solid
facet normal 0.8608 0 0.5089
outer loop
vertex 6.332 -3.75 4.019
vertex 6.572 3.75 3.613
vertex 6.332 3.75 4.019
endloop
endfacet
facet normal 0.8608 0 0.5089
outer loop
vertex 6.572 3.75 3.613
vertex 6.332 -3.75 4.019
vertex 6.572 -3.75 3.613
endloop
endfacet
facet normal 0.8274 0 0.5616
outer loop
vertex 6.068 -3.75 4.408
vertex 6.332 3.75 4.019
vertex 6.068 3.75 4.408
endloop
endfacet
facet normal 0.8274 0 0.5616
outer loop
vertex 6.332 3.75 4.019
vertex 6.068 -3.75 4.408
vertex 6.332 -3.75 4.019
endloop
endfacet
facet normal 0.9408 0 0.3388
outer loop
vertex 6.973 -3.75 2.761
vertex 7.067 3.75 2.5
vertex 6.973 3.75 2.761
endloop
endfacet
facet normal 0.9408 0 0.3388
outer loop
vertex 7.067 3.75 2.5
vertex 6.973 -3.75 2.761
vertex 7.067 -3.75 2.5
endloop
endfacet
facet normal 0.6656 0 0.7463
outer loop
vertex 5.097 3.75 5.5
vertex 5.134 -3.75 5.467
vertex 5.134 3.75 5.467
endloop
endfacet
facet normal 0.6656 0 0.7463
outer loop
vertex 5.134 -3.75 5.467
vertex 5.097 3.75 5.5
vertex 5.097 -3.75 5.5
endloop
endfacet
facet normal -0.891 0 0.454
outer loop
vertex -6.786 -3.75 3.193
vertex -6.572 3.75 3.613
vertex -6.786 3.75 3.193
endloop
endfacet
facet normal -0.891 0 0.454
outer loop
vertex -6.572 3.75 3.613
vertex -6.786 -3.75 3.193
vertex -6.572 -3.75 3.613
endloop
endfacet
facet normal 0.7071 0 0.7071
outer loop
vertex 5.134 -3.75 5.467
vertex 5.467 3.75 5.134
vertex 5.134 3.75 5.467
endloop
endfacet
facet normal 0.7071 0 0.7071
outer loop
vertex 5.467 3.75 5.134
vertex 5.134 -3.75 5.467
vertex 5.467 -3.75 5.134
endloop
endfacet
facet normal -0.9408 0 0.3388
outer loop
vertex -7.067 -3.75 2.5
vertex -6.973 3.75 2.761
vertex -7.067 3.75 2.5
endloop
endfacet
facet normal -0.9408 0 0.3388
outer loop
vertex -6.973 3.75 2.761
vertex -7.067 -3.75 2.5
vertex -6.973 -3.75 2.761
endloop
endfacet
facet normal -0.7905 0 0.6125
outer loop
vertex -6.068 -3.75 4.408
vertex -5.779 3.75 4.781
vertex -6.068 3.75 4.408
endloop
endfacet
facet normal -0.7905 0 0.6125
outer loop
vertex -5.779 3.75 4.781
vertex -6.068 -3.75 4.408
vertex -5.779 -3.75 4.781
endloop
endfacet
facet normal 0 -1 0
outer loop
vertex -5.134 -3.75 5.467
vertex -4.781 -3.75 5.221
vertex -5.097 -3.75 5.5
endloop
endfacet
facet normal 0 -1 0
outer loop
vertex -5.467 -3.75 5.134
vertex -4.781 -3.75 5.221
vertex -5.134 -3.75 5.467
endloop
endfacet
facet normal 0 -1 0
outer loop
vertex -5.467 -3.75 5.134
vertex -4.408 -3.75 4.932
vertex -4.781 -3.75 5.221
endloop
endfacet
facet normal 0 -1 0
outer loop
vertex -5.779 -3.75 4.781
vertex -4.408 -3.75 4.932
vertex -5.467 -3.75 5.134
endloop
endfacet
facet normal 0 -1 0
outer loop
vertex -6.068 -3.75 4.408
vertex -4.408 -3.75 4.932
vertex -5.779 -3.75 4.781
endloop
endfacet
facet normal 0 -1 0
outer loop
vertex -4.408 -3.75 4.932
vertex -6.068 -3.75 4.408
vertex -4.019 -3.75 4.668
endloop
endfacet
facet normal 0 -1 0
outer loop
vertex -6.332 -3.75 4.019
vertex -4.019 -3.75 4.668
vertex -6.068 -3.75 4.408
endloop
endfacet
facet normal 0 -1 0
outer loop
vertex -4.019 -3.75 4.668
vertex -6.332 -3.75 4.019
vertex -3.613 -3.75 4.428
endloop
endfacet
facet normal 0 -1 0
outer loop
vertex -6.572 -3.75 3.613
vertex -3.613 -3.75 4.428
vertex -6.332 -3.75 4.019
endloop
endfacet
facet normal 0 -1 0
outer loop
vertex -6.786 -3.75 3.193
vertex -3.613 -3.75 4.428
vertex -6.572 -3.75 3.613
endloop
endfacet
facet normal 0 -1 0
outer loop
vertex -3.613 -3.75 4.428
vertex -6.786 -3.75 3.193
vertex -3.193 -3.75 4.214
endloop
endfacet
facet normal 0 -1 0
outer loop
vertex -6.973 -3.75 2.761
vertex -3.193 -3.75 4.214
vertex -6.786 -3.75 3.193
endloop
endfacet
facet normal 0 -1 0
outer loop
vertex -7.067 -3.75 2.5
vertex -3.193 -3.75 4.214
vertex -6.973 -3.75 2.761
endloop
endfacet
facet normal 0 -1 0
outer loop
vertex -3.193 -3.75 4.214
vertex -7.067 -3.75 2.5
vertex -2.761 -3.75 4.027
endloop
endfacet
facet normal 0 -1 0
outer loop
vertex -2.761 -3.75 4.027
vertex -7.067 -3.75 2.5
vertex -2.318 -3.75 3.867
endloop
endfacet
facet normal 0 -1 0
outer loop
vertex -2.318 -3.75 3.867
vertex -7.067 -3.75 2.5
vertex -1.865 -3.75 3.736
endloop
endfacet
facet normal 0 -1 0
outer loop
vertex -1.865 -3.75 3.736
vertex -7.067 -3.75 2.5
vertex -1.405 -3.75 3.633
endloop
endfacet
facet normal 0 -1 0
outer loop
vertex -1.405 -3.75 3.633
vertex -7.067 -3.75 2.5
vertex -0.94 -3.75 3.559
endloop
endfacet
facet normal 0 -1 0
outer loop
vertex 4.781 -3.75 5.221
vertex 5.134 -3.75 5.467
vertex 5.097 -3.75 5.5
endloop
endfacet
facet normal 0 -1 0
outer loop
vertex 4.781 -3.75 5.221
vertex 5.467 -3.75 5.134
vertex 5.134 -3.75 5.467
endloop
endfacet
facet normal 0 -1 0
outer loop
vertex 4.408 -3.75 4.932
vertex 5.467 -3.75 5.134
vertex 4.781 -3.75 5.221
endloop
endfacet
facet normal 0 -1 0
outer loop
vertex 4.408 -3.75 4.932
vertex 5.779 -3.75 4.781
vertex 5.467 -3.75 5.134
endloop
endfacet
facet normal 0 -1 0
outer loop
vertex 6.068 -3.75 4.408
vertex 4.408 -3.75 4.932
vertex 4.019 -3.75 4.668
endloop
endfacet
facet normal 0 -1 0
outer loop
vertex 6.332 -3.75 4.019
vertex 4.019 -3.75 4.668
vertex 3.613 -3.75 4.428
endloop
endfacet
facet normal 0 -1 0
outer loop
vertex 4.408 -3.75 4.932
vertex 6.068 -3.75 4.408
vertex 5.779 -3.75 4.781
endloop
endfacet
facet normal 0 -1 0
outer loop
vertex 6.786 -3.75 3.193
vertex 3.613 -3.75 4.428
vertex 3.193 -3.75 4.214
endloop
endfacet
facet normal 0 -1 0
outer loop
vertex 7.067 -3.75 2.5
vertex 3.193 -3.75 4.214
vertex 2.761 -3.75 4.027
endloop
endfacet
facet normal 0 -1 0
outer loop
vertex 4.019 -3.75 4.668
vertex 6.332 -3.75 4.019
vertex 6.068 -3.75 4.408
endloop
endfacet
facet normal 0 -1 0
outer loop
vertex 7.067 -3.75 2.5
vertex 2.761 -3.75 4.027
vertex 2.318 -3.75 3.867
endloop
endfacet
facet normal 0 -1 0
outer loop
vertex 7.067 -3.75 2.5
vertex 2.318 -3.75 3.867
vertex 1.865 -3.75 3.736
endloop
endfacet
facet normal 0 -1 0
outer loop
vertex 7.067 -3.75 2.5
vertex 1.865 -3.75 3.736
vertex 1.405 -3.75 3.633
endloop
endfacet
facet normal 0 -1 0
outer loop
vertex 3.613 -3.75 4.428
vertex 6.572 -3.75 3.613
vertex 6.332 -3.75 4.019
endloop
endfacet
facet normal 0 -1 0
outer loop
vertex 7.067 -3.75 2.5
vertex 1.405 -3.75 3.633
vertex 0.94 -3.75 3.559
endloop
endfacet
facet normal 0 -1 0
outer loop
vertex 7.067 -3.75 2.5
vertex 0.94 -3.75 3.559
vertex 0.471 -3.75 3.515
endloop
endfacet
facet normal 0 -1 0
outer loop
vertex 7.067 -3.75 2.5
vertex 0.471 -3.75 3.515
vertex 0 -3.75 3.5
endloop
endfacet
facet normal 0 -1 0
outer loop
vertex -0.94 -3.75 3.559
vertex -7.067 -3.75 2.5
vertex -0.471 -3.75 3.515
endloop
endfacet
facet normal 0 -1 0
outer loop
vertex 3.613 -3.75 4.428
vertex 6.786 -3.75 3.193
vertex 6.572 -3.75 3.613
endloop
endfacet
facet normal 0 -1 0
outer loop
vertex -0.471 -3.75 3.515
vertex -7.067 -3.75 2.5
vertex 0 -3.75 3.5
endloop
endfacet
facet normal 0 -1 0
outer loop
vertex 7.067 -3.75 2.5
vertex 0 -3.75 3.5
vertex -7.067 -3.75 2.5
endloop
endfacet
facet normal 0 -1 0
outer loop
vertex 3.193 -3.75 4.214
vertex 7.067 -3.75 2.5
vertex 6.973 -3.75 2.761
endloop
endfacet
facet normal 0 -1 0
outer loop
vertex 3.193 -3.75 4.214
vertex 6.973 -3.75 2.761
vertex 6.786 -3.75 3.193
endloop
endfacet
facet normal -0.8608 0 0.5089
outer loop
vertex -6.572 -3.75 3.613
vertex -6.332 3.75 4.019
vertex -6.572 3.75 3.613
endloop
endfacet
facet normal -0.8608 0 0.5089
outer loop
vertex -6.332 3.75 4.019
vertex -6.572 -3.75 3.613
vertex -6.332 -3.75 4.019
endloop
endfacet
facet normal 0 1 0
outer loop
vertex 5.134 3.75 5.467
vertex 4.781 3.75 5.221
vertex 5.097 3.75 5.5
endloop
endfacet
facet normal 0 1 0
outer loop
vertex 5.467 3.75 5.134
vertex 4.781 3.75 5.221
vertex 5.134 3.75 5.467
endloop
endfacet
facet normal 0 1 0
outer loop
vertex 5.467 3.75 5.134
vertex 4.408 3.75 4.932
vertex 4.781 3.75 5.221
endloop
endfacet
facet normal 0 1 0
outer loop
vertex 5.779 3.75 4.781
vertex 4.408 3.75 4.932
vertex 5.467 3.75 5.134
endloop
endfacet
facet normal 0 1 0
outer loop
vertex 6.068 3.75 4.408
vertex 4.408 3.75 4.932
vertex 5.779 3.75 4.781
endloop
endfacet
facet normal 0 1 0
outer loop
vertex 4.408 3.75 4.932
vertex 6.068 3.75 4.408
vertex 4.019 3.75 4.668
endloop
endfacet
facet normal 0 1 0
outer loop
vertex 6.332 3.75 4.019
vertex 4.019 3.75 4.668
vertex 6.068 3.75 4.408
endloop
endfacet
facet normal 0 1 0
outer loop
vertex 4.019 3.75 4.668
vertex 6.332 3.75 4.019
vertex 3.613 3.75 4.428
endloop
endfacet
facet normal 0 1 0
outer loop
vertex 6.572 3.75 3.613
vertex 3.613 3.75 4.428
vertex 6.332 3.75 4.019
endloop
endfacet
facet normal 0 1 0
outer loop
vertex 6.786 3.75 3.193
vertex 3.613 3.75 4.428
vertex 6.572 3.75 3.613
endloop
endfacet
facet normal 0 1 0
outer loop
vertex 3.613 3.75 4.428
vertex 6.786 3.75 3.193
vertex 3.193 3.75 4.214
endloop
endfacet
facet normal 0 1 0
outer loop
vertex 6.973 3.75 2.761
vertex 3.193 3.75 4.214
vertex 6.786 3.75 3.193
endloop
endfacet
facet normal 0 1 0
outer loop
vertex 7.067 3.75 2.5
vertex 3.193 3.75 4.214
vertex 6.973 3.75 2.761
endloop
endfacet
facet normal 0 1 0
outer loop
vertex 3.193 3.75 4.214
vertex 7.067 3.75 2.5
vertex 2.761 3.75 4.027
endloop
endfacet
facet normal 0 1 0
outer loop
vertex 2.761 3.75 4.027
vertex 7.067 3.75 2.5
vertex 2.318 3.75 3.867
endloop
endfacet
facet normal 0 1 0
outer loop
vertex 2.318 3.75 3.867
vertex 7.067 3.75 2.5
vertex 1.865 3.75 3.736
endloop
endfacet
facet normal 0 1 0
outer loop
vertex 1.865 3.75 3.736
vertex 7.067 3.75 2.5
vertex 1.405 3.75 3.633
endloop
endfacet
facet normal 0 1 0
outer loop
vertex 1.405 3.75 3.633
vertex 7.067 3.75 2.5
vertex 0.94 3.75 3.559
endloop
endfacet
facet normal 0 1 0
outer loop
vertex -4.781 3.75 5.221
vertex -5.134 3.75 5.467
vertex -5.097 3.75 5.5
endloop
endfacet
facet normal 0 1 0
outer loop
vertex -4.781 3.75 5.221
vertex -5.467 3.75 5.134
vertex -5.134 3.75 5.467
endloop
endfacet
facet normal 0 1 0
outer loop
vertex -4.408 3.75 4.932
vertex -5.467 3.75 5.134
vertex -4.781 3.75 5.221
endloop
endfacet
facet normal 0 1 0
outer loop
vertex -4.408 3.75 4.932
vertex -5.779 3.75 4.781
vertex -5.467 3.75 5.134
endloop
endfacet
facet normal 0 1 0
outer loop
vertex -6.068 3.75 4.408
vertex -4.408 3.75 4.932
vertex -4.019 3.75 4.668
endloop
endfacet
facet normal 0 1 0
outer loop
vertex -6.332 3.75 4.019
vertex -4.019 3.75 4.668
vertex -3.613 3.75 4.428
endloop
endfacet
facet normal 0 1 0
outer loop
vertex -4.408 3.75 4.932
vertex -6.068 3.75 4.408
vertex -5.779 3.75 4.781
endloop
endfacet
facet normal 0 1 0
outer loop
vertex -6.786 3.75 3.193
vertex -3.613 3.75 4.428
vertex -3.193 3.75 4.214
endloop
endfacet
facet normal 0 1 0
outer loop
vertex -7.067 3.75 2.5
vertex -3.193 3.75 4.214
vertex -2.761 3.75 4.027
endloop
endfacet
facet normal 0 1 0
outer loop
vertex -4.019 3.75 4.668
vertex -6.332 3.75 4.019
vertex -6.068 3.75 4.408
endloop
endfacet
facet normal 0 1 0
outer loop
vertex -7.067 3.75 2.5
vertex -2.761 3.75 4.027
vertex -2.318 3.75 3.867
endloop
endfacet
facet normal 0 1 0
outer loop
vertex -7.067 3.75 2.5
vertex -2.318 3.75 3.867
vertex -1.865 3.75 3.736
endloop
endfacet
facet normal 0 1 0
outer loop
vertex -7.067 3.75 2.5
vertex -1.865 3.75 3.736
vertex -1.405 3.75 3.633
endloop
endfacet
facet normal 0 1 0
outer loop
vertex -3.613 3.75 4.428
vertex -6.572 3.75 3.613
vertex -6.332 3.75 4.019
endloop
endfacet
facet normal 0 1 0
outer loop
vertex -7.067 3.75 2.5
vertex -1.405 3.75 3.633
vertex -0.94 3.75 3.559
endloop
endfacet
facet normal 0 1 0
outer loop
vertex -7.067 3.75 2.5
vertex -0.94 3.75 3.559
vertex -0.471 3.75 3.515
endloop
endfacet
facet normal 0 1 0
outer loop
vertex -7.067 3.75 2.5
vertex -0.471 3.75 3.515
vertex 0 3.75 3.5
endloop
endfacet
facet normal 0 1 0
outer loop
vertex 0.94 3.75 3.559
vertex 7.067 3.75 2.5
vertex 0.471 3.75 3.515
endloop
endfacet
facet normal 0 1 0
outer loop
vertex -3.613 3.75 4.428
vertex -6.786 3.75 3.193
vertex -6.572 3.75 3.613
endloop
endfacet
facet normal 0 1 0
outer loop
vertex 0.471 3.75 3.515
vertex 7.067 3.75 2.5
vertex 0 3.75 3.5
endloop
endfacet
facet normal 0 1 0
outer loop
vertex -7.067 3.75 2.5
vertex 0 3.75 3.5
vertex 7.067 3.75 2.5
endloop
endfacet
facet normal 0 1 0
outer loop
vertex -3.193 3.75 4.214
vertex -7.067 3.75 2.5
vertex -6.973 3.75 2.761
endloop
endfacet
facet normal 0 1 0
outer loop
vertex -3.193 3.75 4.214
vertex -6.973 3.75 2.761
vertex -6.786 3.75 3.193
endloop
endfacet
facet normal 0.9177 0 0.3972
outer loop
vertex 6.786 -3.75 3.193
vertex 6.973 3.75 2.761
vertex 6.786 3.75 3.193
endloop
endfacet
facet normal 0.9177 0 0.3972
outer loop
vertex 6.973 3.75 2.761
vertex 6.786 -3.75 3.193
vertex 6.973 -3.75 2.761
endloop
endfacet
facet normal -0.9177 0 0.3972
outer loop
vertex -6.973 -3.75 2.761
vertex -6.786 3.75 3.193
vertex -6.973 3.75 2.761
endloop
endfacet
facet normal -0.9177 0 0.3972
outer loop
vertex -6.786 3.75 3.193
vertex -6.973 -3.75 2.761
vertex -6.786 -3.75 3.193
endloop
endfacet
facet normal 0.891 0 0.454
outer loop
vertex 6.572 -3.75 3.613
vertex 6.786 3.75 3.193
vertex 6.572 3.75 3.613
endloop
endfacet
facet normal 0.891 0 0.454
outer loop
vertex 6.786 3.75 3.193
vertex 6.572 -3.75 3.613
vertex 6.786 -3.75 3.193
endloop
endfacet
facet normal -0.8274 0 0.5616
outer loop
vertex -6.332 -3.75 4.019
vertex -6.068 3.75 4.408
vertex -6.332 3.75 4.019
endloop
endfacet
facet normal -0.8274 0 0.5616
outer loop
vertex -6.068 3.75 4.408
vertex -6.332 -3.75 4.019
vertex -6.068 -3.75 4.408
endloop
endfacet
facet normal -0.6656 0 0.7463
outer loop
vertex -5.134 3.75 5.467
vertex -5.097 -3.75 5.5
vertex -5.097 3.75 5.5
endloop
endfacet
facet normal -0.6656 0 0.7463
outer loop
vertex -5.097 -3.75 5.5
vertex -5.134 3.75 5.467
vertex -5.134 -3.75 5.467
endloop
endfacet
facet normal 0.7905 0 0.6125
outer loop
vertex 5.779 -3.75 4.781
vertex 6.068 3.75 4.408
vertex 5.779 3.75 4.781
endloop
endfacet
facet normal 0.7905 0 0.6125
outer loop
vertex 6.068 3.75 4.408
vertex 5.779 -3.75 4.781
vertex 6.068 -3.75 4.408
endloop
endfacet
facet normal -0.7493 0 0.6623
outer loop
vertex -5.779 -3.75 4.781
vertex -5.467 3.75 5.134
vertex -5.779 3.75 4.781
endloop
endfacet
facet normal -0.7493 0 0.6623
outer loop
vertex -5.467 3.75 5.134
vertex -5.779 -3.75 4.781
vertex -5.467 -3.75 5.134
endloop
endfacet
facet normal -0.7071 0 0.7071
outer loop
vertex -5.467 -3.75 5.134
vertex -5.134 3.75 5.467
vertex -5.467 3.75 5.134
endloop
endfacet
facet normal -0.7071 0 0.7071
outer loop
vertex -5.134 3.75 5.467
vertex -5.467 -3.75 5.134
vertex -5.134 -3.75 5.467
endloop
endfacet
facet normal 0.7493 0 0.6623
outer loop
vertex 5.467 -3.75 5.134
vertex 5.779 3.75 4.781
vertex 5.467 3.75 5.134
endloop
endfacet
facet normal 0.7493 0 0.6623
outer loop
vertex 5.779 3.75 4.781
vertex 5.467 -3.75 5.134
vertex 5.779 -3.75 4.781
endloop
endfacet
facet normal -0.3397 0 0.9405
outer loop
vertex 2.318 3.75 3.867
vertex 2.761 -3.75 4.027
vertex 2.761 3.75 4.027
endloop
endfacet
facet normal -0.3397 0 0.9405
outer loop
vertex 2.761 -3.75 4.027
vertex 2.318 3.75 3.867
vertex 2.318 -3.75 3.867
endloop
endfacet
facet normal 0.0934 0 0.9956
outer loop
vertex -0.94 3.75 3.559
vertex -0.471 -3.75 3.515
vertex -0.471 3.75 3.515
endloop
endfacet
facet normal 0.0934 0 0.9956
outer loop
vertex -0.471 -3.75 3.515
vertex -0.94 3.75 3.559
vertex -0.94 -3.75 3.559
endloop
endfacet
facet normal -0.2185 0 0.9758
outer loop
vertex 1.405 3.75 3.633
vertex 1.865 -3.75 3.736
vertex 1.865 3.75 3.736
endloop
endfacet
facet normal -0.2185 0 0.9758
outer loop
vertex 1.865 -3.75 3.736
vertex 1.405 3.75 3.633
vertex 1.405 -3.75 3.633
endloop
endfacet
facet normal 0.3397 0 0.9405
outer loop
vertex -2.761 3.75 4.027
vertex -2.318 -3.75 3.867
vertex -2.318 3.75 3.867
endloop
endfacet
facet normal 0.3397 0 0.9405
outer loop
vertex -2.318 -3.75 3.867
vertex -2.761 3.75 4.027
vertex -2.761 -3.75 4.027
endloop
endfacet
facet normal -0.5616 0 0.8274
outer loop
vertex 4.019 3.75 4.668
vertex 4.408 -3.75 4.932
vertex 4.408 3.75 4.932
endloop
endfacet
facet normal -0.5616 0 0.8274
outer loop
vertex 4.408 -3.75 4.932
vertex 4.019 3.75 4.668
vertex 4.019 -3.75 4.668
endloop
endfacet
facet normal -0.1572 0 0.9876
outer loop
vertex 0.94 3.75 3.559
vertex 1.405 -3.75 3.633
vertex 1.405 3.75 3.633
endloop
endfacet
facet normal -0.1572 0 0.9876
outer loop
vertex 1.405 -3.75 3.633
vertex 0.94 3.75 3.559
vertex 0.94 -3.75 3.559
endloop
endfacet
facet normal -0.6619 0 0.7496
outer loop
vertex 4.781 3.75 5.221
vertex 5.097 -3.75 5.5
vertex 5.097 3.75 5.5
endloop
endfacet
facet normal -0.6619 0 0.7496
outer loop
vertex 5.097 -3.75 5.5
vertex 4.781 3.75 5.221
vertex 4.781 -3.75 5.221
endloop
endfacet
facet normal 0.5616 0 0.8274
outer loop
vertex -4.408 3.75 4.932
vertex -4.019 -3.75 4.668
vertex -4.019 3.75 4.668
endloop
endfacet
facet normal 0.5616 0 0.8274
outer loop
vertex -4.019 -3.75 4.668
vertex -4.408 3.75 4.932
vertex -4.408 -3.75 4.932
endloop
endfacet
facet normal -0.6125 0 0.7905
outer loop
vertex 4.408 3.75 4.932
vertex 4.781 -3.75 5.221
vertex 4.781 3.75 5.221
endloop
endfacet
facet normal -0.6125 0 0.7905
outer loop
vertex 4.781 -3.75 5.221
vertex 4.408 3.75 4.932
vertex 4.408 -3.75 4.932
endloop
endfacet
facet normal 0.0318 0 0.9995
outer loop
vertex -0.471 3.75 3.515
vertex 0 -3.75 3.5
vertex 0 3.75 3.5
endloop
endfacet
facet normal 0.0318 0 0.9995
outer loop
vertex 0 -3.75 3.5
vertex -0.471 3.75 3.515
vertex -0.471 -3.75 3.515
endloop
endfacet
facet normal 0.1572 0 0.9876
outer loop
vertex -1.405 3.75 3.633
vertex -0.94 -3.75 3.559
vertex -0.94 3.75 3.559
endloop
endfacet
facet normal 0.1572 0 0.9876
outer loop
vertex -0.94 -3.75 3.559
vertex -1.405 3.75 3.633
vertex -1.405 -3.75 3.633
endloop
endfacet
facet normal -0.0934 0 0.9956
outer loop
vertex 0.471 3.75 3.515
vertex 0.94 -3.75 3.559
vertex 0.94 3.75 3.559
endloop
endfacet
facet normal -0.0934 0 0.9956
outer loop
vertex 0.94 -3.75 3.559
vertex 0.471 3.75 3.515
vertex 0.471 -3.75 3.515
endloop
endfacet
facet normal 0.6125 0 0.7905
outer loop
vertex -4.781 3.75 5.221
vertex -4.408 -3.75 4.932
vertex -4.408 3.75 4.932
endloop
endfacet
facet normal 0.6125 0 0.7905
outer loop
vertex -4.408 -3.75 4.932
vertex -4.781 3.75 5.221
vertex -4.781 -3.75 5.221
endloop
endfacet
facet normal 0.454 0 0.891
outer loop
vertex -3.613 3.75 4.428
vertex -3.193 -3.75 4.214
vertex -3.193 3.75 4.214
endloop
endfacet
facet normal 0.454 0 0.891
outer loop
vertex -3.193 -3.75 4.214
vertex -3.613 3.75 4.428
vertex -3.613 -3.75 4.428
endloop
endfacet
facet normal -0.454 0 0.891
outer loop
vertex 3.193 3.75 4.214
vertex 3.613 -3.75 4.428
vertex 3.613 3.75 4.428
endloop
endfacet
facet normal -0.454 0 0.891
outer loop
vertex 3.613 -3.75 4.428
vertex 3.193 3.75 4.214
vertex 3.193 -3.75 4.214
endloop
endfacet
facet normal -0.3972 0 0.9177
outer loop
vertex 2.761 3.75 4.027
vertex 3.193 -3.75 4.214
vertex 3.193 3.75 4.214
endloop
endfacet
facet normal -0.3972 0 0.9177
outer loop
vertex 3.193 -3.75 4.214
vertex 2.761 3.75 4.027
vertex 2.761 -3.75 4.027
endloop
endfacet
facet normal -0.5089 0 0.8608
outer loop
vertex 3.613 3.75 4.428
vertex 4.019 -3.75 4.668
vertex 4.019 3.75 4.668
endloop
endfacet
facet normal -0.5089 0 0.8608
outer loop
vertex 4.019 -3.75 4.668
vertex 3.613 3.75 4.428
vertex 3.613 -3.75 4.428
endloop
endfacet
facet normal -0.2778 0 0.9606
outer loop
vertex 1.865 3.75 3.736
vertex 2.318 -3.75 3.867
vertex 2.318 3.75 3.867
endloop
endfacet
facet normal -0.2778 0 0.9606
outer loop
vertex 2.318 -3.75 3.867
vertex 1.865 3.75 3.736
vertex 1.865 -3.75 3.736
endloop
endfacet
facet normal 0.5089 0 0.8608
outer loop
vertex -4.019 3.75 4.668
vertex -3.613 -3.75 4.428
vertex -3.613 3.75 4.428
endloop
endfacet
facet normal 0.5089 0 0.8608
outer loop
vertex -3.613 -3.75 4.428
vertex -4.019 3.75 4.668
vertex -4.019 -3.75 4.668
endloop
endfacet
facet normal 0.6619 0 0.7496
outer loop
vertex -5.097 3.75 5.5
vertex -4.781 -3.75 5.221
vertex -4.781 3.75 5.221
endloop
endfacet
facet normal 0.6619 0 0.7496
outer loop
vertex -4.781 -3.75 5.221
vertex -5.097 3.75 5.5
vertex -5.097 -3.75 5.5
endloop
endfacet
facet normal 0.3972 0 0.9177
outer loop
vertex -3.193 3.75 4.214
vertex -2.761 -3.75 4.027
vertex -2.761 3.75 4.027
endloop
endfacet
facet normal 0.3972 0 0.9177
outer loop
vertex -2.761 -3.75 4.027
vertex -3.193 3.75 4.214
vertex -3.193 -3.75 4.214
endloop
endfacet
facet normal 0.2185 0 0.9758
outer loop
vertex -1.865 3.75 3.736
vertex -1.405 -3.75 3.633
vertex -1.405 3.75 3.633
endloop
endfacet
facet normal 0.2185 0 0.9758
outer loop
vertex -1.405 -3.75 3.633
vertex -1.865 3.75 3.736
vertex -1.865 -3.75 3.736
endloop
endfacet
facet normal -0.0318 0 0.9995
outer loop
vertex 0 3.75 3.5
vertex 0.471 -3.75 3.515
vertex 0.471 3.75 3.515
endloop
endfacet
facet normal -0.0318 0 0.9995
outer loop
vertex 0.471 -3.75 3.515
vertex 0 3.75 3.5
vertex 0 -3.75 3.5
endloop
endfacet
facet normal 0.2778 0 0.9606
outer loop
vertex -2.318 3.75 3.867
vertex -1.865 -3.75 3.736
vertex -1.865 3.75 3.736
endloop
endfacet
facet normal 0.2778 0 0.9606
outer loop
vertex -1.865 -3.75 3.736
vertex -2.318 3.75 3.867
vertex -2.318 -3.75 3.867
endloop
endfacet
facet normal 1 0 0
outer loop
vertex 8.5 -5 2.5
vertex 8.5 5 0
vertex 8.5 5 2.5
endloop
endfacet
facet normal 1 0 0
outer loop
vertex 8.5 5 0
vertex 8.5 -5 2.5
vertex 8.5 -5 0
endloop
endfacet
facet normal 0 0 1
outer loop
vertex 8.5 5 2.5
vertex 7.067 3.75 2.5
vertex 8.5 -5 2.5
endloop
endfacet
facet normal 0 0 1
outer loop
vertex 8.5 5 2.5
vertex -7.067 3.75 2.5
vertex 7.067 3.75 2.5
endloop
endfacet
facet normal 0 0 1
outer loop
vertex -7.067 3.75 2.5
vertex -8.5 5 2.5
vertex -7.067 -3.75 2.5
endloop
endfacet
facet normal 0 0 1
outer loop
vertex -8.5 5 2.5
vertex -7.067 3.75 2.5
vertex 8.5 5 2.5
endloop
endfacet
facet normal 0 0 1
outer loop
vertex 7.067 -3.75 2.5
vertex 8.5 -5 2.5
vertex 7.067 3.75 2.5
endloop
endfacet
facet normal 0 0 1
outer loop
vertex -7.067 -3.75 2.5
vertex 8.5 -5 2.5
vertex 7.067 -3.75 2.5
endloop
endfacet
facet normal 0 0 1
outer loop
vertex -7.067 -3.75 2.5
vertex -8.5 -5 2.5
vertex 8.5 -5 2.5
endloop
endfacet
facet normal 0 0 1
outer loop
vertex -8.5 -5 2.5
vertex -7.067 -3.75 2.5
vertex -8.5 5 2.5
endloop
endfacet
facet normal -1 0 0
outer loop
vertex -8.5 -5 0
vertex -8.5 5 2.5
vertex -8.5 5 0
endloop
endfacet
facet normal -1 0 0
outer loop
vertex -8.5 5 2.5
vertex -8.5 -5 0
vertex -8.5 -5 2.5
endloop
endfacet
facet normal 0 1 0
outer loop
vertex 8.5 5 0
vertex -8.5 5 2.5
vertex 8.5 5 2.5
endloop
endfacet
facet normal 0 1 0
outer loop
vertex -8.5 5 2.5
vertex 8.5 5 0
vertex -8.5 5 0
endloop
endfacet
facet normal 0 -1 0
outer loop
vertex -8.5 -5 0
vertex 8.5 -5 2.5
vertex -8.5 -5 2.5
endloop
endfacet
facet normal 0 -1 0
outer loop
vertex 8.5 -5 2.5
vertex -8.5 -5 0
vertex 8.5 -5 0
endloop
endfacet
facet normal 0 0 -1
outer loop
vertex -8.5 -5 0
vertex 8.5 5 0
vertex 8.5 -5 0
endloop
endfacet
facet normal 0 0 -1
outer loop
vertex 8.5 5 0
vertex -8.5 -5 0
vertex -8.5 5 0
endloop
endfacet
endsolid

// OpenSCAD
module switch(){
   difference(){
    union(){ 
   cube([17,10,5], center = true);
   difference(){ 
   rotate([90,0,0]) 
   cylinder(h = 7.5, r=7.5, center=true, $fn=100); 
    rotate([90,0,0]) 
       translate([0,11,0])
   cylinder(h = 8.5, r=7.5, center=true, $fn=100); 
   }
    }
    translate([0,0,-5])
    cube([40,40,10], center=true);
}
}
switch();
